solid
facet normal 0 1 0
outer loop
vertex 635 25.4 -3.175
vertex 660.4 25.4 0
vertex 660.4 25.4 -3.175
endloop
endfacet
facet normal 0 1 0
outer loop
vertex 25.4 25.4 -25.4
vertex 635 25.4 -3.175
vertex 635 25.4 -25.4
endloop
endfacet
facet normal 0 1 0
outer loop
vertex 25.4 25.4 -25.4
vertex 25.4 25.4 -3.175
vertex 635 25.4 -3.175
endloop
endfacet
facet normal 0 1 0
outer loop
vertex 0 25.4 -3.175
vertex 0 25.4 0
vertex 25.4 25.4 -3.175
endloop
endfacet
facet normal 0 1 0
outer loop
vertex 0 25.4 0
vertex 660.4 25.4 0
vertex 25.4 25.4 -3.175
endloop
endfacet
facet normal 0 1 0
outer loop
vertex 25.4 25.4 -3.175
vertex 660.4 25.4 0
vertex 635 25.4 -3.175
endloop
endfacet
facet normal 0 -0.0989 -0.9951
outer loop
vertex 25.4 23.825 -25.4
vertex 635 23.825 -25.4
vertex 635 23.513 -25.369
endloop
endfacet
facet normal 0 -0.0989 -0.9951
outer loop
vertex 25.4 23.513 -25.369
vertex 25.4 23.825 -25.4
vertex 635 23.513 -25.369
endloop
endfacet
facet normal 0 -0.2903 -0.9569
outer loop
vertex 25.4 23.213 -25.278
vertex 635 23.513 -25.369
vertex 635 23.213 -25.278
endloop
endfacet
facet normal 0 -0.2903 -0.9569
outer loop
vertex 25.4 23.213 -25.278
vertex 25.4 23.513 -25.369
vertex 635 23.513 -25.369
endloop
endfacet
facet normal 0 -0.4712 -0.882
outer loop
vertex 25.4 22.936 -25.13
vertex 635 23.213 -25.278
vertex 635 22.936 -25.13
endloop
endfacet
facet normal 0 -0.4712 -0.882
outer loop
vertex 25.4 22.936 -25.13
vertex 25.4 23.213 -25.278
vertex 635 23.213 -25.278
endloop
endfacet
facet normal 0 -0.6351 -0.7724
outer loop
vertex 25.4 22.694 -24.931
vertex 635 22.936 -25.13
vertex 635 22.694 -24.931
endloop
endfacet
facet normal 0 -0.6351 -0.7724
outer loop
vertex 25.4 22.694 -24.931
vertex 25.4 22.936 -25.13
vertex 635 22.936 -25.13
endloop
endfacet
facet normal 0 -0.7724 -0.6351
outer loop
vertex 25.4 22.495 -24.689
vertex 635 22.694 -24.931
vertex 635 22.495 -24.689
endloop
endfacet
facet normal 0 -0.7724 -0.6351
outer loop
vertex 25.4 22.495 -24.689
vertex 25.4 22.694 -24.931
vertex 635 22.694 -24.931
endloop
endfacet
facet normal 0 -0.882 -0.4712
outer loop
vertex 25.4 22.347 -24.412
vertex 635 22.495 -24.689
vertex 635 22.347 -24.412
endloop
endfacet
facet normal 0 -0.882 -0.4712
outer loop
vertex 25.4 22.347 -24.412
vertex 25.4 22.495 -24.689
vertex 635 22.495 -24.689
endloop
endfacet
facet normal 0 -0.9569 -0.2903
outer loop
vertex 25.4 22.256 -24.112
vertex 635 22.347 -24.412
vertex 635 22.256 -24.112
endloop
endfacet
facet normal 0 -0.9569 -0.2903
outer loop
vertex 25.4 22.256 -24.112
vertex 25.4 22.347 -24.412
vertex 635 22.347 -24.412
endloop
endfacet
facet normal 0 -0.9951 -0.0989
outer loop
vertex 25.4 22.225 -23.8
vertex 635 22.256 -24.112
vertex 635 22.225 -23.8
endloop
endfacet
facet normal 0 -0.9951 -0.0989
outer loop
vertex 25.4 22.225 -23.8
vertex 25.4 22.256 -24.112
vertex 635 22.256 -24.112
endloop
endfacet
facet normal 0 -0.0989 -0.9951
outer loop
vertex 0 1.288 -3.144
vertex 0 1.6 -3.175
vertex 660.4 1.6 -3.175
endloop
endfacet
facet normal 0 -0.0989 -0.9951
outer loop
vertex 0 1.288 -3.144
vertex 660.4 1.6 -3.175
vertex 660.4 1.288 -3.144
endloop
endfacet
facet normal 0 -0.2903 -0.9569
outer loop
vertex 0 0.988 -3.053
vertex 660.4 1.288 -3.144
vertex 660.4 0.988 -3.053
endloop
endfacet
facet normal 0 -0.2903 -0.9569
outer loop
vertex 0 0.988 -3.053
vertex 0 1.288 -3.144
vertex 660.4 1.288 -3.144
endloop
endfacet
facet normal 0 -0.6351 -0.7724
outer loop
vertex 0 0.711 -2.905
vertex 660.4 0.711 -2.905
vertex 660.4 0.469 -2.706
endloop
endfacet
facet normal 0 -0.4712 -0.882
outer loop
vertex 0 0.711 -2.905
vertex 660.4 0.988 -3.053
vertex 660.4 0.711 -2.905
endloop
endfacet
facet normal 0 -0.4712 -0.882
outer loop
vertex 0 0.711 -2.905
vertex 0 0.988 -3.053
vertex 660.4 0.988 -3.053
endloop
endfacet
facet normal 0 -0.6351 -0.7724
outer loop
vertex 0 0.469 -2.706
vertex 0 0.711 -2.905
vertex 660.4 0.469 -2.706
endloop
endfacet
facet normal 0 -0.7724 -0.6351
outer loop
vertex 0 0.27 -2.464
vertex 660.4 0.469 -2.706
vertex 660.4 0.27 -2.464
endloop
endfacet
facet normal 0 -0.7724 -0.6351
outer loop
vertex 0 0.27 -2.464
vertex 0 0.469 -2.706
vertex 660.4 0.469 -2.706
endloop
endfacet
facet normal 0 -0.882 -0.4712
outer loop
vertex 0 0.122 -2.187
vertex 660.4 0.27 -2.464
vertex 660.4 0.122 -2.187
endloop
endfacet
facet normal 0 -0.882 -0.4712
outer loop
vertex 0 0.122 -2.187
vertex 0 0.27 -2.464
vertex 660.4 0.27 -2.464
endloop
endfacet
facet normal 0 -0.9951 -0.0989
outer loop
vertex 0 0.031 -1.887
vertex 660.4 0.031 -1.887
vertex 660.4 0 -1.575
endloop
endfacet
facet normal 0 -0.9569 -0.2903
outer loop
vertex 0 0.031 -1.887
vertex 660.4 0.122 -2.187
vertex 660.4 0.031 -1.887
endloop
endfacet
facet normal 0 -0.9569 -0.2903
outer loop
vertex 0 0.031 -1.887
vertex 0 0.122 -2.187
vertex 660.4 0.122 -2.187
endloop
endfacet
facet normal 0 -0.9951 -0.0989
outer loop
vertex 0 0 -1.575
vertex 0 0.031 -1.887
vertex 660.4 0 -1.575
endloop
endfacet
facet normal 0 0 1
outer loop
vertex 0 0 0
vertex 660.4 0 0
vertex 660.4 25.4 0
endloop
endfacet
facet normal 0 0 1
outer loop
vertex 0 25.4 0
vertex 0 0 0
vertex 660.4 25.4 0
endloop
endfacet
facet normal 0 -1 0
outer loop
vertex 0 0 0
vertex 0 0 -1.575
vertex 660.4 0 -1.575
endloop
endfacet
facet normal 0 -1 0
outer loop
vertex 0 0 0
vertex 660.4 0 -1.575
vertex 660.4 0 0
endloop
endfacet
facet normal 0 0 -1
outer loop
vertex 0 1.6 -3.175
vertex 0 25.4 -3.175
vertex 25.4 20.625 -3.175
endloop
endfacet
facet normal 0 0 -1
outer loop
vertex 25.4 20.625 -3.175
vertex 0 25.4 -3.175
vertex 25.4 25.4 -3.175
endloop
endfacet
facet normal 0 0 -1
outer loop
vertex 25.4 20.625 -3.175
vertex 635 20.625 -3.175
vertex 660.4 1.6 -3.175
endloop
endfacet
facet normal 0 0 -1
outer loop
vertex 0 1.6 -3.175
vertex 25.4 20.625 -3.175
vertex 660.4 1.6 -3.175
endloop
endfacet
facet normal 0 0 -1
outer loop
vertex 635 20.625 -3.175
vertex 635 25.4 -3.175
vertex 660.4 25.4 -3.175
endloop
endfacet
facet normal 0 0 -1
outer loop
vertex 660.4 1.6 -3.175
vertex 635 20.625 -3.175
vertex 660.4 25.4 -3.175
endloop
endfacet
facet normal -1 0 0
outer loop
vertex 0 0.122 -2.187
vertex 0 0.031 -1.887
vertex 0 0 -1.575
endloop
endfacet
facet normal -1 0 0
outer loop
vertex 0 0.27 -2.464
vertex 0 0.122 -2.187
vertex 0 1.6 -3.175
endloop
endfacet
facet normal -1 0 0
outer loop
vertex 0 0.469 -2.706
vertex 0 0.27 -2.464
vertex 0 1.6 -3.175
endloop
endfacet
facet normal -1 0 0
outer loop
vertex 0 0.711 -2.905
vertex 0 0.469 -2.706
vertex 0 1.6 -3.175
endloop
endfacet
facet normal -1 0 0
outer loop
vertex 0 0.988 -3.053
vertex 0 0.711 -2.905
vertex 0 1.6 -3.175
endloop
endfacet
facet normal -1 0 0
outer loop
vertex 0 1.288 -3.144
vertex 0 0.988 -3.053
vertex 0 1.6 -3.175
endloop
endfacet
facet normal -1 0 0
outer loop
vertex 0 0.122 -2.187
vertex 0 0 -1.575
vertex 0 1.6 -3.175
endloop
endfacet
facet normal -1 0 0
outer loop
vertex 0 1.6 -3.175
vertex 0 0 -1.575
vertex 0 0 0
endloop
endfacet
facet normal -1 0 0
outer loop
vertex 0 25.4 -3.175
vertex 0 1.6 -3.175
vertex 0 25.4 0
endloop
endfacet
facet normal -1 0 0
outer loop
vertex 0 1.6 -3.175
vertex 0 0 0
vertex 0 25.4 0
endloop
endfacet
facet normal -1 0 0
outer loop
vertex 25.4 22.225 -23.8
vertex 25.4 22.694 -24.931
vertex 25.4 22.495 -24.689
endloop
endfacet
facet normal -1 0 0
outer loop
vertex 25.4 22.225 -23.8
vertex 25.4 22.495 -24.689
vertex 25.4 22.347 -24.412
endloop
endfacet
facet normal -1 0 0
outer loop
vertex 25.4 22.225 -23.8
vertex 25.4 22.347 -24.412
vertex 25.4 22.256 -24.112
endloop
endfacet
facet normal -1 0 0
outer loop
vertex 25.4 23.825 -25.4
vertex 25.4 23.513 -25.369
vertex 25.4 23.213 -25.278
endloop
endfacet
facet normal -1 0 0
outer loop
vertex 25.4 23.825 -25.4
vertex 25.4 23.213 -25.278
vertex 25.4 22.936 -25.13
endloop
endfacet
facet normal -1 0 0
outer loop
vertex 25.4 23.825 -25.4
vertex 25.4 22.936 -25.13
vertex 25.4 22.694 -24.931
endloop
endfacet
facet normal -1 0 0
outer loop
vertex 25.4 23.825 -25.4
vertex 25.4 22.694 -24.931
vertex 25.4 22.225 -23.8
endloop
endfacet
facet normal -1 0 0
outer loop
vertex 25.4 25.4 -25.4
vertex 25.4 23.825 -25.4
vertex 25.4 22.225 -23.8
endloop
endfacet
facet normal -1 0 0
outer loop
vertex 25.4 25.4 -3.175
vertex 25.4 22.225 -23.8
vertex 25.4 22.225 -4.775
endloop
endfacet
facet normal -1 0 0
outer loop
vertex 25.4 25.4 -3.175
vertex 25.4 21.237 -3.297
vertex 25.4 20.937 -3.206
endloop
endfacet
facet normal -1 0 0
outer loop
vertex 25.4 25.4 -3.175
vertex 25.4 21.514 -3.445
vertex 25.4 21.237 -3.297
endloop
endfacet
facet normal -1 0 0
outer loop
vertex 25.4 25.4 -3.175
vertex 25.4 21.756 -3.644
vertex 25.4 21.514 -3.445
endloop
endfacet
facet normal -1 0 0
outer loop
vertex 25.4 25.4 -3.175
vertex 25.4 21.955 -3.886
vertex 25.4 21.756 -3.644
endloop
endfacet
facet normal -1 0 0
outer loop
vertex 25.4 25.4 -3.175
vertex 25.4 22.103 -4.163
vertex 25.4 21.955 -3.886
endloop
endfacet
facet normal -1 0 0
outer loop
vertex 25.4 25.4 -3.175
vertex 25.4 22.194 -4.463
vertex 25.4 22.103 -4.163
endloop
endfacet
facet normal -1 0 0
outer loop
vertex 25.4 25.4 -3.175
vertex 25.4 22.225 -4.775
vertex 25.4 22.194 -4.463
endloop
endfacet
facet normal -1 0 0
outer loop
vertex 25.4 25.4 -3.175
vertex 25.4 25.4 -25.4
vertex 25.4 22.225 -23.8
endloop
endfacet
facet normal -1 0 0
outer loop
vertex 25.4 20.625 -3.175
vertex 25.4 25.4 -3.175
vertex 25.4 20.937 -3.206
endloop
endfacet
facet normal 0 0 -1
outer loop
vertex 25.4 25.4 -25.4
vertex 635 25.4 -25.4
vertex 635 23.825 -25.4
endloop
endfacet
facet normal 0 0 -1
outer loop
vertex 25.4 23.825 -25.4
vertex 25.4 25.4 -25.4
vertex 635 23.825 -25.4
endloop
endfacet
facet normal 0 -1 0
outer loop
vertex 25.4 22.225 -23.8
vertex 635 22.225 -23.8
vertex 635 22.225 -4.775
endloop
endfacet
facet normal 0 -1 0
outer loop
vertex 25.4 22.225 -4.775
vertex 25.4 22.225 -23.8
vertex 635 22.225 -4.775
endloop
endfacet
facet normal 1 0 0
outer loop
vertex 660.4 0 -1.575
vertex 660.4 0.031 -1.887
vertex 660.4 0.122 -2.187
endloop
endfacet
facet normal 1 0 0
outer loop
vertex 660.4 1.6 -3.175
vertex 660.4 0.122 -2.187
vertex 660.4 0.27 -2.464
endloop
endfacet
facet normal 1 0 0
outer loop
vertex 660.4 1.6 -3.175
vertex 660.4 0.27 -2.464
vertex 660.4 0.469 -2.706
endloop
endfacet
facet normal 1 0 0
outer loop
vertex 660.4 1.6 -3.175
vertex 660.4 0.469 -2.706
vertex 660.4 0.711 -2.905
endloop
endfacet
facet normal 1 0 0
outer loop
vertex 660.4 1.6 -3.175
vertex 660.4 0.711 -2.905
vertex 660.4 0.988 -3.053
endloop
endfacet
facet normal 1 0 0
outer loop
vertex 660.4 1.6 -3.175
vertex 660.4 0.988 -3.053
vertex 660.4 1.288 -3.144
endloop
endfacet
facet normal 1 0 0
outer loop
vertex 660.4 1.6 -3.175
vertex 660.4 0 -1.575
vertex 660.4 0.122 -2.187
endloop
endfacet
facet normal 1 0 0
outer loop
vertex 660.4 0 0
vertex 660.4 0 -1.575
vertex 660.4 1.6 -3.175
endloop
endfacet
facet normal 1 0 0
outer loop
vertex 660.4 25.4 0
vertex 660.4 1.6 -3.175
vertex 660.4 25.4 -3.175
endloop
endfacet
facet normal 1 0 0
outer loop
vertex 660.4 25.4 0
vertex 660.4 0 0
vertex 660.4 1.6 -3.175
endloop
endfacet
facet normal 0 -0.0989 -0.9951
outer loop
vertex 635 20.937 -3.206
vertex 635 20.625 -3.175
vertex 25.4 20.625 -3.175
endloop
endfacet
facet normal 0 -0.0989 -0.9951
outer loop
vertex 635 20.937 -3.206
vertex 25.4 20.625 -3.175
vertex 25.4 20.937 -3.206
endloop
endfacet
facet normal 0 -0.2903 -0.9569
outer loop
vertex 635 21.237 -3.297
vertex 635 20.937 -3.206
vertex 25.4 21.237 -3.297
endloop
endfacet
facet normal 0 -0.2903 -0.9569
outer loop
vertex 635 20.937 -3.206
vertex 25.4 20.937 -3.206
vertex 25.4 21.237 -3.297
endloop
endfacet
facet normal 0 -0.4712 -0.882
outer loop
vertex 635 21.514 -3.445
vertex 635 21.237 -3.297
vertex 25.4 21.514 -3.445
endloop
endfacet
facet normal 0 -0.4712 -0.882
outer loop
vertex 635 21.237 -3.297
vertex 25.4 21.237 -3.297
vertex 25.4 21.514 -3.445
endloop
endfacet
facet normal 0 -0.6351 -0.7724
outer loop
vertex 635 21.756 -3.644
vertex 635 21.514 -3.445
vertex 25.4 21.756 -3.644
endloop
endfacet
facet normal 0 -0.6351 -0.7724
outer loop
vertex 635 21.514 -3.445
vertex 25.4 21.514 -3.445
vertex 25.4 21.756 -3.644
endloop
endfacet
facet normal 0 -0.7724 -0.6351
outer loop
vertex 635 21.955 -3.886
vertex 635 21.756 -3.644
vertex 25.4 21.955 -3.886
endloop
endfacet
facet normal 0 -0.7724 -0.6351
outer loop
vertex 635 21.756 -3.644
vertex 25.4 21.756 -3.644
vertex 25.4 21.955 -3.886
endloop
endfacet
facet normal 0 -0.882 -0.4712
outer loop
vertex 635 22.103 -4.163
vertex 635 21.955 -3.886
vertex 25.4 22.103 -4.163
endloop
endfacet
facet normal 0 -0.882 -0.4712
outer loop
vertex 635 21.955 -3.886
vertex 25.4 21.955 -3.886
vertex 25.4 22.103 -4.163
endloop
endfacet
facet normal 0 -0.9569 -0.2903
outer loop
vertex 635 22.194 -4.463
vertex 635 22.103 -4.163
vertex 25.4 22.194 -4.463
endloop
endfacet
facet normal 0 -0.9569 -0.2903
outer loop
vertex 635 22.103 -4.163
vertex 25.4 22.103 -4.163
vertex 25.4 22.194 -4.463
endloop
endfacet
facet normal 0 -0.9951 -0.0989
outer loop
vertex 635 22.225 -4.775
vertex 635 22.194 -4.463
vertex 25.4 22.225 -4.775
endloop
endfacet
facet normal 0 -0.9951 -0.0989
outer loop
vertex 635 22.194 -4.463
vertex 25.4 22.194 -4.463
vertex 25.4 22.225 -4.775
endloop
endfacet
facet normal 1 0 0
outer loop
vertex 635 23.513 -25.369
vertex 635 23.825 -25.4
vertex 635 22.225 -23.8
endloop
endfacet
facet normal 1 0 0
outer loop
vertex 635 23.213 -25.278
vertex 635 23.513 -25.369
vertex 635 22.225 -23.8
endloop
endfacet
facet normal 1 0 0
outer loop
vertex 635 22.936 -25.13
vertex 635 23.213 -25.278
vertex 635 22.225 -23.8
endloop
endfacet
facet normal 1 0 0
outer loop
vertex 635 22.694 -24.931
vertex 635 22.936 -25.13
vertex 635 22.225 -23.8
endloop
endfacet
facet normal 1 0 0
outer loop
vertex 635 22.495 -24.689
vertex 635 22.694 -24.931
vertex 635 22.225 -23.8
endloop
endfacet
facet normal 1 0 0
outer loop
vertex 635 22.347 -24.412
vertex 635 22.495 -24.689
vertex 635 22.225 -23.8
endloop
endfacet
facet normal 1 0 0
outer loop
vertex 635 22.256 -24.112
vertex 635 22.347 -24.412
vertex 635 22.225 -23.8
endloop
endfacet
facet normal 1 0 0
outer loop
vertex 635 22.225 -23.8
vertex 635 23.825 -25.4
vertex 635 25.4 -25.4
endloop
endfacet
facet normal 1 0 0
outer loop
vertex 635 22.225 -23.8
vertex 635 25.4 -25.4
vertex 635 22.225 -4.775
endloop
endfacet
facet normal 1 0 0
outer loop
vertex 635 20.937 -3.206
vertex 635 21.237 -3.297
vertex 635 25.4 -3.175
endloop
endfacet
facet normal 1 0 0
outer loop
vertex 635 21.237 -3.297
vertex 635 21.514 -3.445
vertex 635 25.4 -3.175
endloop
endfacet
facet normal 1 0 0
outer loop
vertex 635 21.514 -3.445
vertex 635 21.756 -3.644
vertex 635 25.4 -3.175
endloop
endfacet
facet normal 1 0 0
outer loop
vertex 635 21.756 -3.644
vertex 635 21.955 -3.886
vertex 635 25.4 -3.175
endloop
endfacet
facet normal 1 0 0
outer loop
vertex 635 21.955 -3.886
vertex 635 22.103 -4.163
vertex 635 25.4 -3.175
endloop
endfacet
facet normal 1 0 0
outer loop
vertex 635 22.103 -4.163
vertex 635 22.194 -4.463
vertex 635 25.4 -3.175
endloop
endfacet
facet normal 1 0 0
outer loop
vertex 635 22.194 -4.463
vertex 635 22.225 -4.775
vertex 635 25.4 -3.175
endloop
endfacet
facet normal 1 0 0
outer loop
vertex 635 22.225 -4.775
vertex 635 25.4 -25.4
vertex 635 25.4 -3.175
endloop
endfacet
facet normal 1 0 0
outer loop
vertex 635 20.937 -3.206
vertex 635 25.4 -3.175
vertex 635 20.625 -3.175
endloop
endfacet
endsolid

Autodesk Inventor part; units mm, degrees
ref_plane "YZ Plane" through (0, 0, 0) normal (1, 0, 0) x (0, 1, 0)
ref_plane "XZ Plane" through (0, 0, 0) normal (0, 1, 0) x (-1, 0, 0)
ref_plane "XY Plane" through (0, 0, 0) normal (0, 0, 1) x (1, 0, 0)
sketch "Sketch1" plane through (0, 0, 0) normal (1, 0, 0) x (0, 1, 0)
  line L0 (0, 0) -> (25.4, 0)
  line L1 (25.4, 0) -> (25.4, -25.4)
  line L2 (25.4, -25.4) -> (23.8252, -25.4)
  line L3 (0, -1.5748) -> (0, 0)
  line L4 (25.4, 0) -> (22.225, 0) construction
  line L5 (22.225, 0) -> (22.225, -3.175) construction
  line L6 (22.225, -3.175) -> (25.4, -3.175) construction
  line L7 (25.4, -3.175) -> (25.4, 0) construction
  line L8 (25.4, -25.4) -> (22.225, -25.4) construction
  line L9 (0, 0) -> (0, -3.175) construction
  line L10 (1.6002, -3.175) -> (20.6248, -3.175)
  line L11 (22.225, -23.7998) -> (22.225, -4.7752)
  arc A0 (22.225, -23.7998) -> (23.8252, -25.4) centre (23.8252, -23.7998) ccw
  arc A1 (0, -1.5748) -> (1.6002, -3.175) centre (1.6002, -1.5748) ccw
  arc A2 (22.225, -4.7752) -> (20.6248, -3.175) centre (20.6248, -4.7752) ccw
  point P0 (0, -25.4)
  dimension "d0" = 25.4
  dimension "d1" = 25.4
  dimension "d2" = 3.175
  dimension "d3" = 3.175
  dimension "d4" = 3.175
  dimension "d5" = 3.175
  dimension "d6" = 1.6002
  dimension "d7" = 1.6002
extrude "Extrusion1" add sketch "Sketch1" along normal blind 660.4
sketch "Sketch2" plane through (0, 25.4, 0) normal (0, 1, 0) x (1, 0, 0)
  line L0 (0, 25.4) -> (0, 23.7998) projected
  line L1 (0, 3.175) -> (660.4, 3.175) projected
  line L2 (0, 25.4) -> (25.4, 25.4)
  line L3 (25.4, 25.4) -> (25.4, 3.175)
  line L4 (25.4, 3.175) -> (0, 3.175)
  line L5 (0, 3.175) -> (0, 25.4)
  line L6 (660.4, 25.4) -> (635, 25.4)
  line L7 (635, 25.4) -> (635, 3.175)
  line L8 (635, 3.175) -> (660.4, 3.175)
  line L9 (660.4, 3.175) -> (660.4, 25.4)
  point P0 (0, 0)
  dimension "d10" = 25.4
  dimension "d11" = 25.4
  dimension "d12" = 22.225
extrude "Extrusion2" cut sketch "Sketch2" against normal blind 25.4
properties part number "24in1.0Lch" material "Steel, Mild"
